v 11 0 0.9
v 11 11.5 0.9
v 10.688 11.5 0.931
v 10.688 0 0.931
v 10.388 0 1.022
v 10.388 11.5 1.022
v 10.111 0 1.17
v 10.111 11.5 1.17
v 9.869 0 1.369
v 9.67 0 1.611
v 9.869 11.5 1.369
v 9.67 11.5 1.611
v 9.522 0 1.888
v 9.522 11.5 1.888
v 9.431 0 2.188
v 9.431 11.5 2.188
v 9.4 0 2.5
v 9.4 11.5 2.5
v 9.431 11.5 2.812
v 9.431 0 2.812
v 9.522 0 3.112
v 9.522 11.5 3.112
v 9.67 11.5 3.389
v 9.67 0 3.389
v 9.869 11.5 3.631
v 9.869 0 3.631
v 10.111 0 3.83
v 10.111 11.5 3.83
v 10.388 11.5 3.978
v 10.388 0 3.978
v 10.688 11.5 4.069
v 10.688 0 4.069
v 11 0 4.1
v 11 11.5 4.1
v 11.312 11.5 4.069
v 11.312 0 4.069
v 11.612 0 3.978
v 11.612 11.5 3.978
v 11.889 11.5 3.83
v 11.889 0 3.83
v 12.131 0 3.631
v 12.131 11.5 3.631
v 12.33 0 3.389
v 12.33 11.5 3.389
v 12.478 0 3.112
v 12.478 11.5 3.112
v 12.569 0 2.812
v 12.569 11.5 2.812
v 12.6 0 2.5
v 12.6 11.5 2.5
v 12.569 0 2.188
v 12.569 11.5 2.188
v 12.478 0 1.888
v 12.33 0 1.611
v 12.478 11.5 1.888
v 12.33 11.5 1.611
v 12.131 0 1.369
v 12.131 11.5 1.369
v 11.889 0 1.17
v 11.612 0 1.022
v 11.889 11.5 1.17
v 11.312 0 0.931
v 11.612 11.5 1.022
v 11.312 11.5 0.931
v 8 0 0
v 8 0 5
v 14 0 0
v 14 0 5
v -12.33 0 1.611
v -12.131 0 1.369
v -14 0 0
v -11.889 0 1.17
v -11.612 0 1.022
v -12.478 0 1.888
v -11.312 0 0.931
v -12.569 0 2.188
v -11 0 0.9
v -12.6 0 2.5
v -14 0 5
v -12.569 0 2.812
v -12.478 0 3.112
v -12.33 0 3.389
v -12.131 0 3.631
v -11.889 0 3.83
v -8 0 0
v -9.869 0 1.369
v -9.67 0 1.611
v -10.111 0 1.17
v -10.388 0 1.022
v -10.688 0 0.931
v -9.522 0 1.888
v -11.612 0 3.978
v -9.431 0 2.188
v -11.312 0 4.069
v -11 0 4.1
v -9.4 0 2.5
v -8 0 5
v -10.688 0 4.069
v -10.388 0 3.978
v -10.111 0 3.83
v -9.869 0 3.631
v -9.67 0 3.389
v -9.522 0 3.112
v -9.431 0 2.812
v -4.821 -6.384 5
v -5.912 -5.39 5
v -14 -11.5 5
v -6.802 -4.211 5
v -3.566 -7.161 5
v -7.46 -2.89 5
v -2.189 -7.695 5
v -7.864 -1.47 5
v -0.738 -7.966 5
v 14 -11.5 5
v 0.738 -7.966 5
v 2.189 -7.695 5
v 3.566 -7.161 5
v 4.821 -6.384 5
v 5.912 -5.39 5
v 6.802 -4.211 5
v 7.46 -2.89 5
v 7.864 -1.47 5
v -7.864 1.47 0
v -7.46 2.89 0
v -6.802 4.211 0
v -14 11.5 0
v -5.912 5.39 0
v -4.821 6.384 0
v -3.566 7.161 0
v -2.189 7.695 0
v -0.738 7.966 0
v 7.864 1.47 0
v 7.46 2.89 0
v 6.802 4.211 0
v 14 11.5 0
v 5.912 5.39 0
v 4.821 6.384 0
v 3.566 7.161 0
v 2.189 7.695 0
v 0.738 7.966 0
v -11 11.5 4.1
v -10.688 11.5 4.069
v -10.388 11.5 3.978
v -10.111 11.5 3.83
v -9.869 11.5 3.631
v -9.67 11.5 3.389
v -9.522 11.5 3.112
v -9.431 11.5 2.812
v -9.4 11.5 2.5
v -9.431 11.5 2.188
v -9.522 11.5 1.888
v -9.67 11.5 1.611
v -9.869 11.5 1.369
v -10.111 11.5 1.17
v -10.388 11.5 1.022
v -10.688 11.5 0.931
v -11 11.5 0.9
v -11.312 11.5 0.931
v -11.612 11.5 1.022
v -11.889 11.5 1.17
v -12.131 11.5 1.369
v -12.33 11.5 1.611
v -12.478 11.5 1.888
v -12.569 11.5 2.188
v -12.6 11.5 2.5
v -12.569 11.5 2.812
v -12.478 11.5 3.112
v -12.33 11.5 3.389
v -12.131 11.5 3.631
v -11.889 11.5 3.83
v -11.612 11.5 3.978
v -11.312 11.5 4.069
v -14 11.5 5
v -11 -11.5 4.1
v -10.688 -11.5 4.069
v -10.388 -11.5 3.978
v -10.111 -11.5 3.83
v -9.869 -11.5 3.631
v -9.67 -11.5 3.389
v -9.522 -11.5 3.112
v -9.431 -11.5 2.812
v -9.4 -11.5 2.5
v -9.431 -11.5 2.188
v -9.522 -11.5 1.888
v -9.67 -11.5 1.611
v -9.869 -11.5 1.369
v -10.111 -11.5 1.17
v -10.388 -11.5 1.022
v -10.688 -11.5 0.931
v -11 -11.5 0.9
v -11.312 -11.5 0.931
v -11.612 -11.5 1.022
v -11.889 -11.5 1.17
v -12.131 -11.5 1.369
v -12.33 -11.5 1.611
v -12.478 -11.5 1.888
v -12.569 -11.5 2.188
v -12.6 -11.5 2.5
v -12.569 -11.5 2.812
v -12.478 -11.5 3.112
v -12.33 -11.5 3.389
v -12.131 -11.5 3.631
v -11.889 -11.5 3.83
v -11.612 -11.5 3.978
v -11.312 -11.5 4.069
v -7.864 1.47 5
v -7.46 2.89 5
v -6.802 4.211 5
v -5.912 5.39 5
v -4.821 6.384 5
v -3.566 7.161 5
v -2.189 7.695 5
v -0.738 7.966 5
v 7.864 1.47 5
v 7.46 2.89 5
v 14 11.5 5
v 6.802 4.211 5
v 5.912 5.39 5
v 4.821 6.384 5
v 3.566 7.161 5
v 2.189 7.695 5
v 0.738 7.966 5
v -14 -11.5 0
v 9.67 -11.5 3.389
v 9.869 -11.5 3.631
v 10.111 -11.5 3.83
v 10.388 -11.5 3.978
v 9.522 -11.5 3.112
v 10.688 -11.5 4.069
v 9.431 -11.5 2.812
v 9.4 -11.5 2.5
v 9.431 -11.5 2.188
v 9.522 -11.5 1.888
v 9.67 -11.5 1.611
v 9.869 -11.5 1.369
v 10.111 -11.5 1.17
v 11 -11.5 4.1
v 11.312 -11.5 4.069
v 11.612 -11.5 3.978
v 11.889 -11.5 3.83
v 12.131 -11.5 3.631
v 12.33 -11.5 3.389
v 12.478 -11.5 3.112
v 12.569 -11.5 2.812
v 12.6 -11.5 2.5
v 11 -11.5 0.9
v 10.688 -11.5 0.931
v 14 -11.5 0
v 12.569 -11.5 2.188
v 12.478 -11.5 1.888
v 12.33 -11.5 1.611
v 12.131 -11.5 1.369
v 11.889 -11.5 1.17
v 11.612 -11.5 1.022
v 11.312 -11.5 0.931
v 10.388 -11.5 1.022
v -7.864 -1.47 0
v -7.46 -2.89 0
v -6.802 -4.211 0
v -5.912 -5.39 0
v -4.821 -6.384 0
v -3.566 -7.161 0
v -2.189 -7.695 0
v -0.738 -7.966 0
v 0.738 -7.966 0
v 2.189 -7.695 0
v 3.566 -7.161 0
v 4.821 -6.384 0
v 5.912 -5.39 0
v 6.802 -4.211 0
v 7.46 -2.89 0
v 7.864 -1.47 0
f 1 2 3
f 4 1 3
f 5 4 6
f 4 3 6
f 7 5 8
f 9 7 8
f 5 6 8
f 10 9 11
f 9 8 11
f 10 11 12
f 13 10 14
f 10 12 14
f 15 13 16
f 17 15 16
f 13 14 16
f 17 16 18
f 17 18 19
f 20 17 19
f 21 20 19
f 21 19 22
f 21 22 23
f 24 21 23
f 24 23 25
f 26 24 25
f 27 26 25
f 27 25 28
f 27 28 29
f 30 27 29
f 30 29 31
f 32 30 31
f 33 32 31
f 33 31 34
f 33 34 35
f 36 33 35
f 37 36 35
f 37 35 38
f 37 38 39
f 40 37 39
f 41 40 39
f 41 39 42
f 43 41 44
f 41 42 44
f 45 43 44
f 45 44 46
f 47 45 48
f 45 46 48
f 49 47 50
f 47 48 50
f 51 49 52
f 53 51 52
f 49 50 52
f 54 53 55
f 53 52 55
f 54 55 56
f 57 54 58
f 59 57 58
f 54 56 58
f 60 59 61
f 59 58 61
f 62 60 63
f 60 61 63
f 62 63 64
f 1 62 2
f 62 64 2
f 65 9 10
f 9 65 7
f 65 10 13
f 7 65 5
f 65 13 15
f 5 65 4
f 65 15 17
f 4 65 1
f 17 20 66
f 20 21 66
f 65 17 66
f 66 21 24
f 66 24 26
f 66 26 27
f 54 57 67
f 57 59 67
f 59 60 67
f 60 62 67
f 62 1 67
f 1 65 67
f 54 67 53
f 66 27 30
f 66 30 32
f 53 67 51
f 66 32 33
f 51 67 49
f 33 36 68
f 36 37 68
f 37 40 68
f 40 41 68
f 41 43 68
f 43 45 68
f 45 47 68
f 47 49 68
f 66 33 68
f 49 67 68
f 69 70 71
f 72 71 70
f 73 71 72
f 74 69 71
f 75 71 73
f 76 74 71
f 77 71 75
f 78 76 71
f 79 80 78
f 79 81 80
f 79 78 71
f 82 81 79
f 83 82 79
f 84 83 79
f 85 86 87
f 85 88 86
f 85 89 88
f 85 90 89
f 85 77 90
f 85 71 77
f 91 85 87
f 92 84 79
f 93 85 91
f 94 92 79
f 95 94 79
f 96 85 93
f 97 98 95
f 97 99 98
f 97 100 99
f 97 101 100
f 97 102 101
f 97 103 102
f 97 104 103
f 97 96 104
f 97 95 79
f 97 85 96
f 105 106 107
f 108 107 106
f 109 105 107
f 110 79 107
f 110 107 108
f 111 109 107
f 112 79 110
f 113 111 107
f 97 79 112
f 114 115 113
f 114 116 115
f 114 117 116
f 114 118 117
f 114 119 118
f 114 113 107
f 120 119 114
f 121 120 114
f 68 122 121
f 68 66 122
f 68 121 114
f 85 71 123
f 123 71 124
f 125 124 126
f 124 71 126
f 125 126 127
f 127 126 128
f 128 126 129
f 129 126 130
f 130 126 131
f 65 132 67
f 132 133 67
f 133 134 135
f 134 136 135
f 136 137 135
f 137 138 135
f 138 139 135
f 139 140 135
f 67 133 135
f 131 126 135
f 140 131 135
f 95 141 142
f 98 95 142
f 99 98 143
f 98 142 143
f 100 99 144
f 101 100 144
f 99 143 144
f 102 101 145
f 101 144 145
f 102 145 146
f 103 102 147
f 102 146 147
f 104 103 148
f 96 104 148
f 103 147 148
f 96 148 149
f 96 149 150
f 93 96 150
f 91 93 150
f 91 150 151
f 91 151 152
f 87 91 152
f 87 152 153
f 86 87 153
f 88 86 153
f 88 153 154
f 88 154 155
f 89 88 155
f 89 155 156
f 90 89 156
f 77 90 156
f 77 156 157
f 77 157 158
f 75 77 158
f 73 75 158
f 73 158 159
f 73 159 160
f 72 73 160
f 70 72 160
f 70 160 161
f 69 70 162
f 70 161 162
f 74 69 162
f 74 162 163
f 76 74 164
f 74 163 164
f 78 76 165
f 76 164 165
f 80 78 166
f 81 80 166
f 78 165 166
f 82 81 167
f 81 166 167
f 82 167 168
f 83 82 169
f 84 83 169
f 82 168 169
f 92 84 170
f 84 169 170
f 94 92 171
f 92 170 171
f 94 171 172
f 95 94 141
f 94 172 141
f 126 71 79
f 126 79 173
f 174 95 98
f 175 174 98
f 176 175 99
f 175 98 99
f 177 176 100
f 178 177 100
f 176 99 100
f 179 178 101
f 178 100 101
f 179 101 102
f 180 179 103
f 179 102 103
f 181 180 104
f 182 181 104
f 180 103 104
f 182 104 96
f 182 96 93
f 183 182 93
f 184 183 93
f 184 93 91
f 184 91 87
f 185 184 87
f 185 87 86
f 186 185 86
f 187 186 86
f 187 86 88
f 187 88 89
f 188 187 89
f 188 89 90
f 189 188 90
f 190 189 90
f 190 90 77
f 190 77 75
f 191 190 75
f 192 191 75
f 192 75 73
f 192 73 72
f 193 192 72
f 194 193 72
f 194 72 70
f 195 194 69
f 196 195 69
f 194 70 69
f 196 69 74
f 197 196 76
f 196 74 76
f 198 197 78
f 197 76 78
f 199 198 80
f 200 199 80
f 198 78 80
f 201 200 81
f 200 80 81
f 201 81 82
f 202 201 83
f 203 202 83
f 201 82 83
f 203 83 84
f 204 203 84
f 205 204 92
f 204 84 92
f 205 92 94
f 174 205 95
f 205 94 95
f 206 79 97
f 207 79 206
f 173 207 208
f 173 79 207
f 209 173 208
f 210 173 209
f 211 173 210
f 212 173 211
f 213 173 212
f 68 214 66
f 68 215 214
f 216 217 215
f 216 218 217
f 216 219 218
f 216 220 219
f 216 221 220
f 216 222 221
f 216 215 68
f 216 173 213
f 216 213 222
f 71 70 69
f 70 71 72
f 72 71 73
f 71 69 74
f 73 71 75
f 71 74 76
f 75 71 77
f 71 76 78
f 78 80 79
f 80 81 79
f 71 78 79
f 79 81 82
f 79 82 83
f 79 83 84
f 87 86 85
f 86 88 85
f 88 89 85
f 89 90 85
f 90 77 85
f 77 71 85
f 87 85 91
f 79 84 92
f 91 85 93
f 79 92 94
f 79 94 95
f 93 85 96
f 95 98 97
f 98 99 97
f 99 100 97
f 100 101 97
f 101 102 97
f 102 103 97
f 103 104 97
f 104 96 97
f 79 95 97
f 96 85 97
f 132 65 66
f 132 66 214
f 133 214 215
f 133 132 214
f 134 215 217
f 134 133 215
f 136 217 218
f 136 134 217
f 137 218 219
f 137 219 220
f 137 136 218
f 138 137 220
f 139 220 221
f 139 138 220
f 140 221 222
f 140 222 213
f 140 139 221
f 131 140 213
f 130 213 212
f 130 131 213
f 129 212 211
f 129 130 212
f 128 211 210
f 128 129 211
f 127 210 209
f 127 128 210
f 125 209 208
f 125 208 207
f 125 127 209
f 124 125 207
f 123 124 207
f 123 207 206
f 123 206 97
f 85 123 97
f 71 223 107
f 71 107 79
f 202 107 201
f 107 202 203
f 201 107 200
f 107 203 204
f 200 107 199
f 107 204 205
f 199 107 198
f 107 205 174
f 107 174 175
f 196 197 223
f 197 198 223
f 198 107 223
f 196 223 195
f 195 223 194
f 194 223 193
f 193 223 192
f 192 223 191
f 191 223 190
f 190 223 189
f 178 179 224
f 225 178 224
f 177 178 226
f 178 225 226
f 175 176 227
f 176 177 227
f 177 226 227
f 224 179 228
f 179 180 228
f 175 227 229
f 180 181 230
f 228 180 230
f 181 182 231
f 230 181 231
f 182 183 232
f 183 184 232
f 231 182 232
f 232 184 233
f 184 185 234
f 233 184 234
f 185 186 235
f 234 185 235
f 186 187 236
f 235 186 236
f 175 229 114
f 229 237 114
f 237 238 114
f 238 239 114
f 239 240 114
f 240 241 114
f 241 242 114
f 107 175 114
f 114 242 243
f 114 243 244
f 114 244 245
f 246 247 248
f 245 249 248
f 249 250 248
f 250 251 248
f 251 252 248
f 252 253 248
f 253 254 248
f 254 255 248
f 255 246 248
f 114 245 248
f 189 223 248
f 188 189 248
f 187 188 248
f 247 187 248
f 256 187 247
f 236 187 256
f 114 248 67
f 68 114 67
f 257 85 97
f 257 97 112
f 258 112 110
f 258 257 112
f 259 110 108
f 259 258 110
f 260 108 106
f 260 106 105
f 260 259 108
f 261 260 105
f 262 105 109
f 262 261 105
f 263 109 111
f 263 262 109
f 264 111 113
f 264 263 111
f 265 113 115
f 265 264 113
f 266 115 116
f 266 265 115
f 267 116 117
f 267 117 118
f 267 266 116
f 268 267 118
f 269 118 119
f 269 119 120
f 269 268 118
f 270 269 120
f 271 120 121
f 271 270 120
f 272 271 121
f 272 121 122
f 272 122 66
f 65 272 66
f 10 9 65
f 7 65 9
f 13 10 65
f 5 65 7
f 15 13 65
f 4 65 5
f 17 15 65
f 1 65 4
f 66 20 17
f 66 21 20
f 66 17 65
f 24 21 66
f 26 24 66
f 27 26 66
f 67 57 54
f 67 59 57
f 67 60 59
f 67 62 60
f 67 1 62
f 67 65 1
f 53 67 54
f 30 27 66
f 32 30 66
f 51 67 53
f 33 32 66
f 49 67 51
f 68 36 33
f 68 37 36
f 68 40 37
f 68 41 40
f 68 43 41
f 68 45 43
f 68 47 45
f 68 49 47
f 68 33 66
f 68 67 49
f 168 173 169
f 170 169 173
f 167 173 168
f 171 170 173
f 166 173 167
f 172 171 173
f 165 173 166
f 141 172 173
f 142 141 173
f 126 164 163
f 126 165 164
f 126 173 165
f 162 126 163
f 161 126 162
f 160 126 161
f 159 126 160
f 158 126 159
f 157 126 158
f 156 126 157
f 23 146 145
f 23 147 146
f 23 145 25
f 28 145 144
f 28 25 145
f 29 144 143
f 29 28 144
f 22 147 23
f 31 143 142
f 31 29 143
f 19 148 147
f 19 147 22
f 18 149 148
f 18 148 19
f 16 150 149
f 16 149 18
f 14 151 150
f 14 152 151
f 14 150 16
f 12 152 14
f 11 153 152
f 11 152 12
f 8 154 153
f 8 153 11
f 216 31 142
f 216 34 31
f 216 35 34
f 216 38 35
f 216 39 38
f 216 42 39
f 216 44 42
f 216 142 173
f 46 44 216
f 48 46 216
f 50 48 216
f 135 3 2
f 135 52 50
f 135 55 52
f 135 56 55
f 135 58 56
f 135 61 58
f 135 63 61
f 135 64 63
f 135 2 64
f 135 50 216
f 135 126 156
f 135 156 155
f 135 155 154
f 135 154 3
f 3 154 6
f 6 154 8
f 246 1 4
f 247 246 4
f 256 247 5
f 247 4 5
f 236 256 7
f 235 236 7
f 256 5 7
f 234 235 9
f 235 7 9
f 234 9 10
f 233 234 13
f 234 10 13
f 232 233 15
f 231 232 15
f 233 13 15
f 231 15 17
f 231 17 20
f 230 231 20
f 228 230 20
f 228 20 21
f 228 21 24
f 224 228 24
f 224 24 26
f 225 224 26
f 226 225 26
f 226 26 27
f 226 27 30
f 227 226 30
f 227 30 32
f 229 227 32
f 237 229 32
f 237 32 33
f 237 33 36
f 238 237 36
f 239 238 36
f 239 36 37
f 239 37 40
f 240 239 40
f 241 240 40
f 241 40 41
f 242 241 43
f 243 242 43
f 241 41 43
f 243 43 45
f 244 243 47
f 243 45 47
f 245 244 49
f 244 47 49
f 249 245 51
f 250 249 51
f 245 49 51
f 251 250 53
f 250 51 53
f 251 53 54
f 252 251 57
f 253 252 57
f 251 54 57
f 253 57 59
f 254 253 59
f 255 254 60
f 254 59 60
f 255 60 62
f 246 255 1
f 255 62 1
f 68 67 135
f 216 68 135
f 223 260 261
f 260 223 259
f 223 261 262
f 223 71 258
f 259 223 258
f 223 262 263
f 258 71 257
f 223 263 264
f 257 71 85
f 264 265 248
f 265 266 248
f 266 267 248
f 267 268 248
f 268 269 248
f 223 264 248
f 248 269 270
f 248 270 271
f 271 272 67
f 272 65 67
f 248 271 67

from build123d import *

# Parameters (mm, degrees)
SKETCH_1_W          = 28
SKETCH_1_H          = 23
SKETCH_1_R          = 8
EXTRUDE_1_DEPTH     = 5
SKETCH_2_R          = 1.6
CUT_EXTRUDE_1_DEPTH = 28.386127875


with BuildPart() as part:
    # 草图1 → 凸台-拉伸1 (new body)
    with BuildSketch(Plane.XY):
        Rectangle(SKETCH_1_W, SKETCH_1_H)
        Circle(SKETCH_1_R, mode=Mode.SUBTRACT)
    extrude(amount=EXTRUDE_1_DEPTH)

    # 草图2 → 切除-拉伸1 (cut, through all)
    with BuildSketch(Plane(origin=(0, 11.5, 0), x_dir=(1, 0, 0), z_dir=(0, 1, 0))):
        with Locations(Location((-11, -2.5, 0), (0, 0, 270))):
            Circle(SKETCH_2_R)
        with Locations(Location((11, -2.5, 0), (0, 0, 90))):
            Circle(SKETCH_2_R)
    extrude(amount=-CUT_EXTRUDE_1_DEPTH, mode=Mode.SUBTRACT)


with BuildPart() as body_2:
    # Split Bodies 1: the piece on the far side of the plane
    add(part.part)
    split(bisect_by=Plane.ZX, keep=Keep.BOTTOM)


with BuildPart() as part_1:
    add(part.part)

    # Split Bodies 1
    split(bisect_by=Plane.ZX, keep=Keep.TOP)


solid = Compound([body_2.part, part_1.part])
